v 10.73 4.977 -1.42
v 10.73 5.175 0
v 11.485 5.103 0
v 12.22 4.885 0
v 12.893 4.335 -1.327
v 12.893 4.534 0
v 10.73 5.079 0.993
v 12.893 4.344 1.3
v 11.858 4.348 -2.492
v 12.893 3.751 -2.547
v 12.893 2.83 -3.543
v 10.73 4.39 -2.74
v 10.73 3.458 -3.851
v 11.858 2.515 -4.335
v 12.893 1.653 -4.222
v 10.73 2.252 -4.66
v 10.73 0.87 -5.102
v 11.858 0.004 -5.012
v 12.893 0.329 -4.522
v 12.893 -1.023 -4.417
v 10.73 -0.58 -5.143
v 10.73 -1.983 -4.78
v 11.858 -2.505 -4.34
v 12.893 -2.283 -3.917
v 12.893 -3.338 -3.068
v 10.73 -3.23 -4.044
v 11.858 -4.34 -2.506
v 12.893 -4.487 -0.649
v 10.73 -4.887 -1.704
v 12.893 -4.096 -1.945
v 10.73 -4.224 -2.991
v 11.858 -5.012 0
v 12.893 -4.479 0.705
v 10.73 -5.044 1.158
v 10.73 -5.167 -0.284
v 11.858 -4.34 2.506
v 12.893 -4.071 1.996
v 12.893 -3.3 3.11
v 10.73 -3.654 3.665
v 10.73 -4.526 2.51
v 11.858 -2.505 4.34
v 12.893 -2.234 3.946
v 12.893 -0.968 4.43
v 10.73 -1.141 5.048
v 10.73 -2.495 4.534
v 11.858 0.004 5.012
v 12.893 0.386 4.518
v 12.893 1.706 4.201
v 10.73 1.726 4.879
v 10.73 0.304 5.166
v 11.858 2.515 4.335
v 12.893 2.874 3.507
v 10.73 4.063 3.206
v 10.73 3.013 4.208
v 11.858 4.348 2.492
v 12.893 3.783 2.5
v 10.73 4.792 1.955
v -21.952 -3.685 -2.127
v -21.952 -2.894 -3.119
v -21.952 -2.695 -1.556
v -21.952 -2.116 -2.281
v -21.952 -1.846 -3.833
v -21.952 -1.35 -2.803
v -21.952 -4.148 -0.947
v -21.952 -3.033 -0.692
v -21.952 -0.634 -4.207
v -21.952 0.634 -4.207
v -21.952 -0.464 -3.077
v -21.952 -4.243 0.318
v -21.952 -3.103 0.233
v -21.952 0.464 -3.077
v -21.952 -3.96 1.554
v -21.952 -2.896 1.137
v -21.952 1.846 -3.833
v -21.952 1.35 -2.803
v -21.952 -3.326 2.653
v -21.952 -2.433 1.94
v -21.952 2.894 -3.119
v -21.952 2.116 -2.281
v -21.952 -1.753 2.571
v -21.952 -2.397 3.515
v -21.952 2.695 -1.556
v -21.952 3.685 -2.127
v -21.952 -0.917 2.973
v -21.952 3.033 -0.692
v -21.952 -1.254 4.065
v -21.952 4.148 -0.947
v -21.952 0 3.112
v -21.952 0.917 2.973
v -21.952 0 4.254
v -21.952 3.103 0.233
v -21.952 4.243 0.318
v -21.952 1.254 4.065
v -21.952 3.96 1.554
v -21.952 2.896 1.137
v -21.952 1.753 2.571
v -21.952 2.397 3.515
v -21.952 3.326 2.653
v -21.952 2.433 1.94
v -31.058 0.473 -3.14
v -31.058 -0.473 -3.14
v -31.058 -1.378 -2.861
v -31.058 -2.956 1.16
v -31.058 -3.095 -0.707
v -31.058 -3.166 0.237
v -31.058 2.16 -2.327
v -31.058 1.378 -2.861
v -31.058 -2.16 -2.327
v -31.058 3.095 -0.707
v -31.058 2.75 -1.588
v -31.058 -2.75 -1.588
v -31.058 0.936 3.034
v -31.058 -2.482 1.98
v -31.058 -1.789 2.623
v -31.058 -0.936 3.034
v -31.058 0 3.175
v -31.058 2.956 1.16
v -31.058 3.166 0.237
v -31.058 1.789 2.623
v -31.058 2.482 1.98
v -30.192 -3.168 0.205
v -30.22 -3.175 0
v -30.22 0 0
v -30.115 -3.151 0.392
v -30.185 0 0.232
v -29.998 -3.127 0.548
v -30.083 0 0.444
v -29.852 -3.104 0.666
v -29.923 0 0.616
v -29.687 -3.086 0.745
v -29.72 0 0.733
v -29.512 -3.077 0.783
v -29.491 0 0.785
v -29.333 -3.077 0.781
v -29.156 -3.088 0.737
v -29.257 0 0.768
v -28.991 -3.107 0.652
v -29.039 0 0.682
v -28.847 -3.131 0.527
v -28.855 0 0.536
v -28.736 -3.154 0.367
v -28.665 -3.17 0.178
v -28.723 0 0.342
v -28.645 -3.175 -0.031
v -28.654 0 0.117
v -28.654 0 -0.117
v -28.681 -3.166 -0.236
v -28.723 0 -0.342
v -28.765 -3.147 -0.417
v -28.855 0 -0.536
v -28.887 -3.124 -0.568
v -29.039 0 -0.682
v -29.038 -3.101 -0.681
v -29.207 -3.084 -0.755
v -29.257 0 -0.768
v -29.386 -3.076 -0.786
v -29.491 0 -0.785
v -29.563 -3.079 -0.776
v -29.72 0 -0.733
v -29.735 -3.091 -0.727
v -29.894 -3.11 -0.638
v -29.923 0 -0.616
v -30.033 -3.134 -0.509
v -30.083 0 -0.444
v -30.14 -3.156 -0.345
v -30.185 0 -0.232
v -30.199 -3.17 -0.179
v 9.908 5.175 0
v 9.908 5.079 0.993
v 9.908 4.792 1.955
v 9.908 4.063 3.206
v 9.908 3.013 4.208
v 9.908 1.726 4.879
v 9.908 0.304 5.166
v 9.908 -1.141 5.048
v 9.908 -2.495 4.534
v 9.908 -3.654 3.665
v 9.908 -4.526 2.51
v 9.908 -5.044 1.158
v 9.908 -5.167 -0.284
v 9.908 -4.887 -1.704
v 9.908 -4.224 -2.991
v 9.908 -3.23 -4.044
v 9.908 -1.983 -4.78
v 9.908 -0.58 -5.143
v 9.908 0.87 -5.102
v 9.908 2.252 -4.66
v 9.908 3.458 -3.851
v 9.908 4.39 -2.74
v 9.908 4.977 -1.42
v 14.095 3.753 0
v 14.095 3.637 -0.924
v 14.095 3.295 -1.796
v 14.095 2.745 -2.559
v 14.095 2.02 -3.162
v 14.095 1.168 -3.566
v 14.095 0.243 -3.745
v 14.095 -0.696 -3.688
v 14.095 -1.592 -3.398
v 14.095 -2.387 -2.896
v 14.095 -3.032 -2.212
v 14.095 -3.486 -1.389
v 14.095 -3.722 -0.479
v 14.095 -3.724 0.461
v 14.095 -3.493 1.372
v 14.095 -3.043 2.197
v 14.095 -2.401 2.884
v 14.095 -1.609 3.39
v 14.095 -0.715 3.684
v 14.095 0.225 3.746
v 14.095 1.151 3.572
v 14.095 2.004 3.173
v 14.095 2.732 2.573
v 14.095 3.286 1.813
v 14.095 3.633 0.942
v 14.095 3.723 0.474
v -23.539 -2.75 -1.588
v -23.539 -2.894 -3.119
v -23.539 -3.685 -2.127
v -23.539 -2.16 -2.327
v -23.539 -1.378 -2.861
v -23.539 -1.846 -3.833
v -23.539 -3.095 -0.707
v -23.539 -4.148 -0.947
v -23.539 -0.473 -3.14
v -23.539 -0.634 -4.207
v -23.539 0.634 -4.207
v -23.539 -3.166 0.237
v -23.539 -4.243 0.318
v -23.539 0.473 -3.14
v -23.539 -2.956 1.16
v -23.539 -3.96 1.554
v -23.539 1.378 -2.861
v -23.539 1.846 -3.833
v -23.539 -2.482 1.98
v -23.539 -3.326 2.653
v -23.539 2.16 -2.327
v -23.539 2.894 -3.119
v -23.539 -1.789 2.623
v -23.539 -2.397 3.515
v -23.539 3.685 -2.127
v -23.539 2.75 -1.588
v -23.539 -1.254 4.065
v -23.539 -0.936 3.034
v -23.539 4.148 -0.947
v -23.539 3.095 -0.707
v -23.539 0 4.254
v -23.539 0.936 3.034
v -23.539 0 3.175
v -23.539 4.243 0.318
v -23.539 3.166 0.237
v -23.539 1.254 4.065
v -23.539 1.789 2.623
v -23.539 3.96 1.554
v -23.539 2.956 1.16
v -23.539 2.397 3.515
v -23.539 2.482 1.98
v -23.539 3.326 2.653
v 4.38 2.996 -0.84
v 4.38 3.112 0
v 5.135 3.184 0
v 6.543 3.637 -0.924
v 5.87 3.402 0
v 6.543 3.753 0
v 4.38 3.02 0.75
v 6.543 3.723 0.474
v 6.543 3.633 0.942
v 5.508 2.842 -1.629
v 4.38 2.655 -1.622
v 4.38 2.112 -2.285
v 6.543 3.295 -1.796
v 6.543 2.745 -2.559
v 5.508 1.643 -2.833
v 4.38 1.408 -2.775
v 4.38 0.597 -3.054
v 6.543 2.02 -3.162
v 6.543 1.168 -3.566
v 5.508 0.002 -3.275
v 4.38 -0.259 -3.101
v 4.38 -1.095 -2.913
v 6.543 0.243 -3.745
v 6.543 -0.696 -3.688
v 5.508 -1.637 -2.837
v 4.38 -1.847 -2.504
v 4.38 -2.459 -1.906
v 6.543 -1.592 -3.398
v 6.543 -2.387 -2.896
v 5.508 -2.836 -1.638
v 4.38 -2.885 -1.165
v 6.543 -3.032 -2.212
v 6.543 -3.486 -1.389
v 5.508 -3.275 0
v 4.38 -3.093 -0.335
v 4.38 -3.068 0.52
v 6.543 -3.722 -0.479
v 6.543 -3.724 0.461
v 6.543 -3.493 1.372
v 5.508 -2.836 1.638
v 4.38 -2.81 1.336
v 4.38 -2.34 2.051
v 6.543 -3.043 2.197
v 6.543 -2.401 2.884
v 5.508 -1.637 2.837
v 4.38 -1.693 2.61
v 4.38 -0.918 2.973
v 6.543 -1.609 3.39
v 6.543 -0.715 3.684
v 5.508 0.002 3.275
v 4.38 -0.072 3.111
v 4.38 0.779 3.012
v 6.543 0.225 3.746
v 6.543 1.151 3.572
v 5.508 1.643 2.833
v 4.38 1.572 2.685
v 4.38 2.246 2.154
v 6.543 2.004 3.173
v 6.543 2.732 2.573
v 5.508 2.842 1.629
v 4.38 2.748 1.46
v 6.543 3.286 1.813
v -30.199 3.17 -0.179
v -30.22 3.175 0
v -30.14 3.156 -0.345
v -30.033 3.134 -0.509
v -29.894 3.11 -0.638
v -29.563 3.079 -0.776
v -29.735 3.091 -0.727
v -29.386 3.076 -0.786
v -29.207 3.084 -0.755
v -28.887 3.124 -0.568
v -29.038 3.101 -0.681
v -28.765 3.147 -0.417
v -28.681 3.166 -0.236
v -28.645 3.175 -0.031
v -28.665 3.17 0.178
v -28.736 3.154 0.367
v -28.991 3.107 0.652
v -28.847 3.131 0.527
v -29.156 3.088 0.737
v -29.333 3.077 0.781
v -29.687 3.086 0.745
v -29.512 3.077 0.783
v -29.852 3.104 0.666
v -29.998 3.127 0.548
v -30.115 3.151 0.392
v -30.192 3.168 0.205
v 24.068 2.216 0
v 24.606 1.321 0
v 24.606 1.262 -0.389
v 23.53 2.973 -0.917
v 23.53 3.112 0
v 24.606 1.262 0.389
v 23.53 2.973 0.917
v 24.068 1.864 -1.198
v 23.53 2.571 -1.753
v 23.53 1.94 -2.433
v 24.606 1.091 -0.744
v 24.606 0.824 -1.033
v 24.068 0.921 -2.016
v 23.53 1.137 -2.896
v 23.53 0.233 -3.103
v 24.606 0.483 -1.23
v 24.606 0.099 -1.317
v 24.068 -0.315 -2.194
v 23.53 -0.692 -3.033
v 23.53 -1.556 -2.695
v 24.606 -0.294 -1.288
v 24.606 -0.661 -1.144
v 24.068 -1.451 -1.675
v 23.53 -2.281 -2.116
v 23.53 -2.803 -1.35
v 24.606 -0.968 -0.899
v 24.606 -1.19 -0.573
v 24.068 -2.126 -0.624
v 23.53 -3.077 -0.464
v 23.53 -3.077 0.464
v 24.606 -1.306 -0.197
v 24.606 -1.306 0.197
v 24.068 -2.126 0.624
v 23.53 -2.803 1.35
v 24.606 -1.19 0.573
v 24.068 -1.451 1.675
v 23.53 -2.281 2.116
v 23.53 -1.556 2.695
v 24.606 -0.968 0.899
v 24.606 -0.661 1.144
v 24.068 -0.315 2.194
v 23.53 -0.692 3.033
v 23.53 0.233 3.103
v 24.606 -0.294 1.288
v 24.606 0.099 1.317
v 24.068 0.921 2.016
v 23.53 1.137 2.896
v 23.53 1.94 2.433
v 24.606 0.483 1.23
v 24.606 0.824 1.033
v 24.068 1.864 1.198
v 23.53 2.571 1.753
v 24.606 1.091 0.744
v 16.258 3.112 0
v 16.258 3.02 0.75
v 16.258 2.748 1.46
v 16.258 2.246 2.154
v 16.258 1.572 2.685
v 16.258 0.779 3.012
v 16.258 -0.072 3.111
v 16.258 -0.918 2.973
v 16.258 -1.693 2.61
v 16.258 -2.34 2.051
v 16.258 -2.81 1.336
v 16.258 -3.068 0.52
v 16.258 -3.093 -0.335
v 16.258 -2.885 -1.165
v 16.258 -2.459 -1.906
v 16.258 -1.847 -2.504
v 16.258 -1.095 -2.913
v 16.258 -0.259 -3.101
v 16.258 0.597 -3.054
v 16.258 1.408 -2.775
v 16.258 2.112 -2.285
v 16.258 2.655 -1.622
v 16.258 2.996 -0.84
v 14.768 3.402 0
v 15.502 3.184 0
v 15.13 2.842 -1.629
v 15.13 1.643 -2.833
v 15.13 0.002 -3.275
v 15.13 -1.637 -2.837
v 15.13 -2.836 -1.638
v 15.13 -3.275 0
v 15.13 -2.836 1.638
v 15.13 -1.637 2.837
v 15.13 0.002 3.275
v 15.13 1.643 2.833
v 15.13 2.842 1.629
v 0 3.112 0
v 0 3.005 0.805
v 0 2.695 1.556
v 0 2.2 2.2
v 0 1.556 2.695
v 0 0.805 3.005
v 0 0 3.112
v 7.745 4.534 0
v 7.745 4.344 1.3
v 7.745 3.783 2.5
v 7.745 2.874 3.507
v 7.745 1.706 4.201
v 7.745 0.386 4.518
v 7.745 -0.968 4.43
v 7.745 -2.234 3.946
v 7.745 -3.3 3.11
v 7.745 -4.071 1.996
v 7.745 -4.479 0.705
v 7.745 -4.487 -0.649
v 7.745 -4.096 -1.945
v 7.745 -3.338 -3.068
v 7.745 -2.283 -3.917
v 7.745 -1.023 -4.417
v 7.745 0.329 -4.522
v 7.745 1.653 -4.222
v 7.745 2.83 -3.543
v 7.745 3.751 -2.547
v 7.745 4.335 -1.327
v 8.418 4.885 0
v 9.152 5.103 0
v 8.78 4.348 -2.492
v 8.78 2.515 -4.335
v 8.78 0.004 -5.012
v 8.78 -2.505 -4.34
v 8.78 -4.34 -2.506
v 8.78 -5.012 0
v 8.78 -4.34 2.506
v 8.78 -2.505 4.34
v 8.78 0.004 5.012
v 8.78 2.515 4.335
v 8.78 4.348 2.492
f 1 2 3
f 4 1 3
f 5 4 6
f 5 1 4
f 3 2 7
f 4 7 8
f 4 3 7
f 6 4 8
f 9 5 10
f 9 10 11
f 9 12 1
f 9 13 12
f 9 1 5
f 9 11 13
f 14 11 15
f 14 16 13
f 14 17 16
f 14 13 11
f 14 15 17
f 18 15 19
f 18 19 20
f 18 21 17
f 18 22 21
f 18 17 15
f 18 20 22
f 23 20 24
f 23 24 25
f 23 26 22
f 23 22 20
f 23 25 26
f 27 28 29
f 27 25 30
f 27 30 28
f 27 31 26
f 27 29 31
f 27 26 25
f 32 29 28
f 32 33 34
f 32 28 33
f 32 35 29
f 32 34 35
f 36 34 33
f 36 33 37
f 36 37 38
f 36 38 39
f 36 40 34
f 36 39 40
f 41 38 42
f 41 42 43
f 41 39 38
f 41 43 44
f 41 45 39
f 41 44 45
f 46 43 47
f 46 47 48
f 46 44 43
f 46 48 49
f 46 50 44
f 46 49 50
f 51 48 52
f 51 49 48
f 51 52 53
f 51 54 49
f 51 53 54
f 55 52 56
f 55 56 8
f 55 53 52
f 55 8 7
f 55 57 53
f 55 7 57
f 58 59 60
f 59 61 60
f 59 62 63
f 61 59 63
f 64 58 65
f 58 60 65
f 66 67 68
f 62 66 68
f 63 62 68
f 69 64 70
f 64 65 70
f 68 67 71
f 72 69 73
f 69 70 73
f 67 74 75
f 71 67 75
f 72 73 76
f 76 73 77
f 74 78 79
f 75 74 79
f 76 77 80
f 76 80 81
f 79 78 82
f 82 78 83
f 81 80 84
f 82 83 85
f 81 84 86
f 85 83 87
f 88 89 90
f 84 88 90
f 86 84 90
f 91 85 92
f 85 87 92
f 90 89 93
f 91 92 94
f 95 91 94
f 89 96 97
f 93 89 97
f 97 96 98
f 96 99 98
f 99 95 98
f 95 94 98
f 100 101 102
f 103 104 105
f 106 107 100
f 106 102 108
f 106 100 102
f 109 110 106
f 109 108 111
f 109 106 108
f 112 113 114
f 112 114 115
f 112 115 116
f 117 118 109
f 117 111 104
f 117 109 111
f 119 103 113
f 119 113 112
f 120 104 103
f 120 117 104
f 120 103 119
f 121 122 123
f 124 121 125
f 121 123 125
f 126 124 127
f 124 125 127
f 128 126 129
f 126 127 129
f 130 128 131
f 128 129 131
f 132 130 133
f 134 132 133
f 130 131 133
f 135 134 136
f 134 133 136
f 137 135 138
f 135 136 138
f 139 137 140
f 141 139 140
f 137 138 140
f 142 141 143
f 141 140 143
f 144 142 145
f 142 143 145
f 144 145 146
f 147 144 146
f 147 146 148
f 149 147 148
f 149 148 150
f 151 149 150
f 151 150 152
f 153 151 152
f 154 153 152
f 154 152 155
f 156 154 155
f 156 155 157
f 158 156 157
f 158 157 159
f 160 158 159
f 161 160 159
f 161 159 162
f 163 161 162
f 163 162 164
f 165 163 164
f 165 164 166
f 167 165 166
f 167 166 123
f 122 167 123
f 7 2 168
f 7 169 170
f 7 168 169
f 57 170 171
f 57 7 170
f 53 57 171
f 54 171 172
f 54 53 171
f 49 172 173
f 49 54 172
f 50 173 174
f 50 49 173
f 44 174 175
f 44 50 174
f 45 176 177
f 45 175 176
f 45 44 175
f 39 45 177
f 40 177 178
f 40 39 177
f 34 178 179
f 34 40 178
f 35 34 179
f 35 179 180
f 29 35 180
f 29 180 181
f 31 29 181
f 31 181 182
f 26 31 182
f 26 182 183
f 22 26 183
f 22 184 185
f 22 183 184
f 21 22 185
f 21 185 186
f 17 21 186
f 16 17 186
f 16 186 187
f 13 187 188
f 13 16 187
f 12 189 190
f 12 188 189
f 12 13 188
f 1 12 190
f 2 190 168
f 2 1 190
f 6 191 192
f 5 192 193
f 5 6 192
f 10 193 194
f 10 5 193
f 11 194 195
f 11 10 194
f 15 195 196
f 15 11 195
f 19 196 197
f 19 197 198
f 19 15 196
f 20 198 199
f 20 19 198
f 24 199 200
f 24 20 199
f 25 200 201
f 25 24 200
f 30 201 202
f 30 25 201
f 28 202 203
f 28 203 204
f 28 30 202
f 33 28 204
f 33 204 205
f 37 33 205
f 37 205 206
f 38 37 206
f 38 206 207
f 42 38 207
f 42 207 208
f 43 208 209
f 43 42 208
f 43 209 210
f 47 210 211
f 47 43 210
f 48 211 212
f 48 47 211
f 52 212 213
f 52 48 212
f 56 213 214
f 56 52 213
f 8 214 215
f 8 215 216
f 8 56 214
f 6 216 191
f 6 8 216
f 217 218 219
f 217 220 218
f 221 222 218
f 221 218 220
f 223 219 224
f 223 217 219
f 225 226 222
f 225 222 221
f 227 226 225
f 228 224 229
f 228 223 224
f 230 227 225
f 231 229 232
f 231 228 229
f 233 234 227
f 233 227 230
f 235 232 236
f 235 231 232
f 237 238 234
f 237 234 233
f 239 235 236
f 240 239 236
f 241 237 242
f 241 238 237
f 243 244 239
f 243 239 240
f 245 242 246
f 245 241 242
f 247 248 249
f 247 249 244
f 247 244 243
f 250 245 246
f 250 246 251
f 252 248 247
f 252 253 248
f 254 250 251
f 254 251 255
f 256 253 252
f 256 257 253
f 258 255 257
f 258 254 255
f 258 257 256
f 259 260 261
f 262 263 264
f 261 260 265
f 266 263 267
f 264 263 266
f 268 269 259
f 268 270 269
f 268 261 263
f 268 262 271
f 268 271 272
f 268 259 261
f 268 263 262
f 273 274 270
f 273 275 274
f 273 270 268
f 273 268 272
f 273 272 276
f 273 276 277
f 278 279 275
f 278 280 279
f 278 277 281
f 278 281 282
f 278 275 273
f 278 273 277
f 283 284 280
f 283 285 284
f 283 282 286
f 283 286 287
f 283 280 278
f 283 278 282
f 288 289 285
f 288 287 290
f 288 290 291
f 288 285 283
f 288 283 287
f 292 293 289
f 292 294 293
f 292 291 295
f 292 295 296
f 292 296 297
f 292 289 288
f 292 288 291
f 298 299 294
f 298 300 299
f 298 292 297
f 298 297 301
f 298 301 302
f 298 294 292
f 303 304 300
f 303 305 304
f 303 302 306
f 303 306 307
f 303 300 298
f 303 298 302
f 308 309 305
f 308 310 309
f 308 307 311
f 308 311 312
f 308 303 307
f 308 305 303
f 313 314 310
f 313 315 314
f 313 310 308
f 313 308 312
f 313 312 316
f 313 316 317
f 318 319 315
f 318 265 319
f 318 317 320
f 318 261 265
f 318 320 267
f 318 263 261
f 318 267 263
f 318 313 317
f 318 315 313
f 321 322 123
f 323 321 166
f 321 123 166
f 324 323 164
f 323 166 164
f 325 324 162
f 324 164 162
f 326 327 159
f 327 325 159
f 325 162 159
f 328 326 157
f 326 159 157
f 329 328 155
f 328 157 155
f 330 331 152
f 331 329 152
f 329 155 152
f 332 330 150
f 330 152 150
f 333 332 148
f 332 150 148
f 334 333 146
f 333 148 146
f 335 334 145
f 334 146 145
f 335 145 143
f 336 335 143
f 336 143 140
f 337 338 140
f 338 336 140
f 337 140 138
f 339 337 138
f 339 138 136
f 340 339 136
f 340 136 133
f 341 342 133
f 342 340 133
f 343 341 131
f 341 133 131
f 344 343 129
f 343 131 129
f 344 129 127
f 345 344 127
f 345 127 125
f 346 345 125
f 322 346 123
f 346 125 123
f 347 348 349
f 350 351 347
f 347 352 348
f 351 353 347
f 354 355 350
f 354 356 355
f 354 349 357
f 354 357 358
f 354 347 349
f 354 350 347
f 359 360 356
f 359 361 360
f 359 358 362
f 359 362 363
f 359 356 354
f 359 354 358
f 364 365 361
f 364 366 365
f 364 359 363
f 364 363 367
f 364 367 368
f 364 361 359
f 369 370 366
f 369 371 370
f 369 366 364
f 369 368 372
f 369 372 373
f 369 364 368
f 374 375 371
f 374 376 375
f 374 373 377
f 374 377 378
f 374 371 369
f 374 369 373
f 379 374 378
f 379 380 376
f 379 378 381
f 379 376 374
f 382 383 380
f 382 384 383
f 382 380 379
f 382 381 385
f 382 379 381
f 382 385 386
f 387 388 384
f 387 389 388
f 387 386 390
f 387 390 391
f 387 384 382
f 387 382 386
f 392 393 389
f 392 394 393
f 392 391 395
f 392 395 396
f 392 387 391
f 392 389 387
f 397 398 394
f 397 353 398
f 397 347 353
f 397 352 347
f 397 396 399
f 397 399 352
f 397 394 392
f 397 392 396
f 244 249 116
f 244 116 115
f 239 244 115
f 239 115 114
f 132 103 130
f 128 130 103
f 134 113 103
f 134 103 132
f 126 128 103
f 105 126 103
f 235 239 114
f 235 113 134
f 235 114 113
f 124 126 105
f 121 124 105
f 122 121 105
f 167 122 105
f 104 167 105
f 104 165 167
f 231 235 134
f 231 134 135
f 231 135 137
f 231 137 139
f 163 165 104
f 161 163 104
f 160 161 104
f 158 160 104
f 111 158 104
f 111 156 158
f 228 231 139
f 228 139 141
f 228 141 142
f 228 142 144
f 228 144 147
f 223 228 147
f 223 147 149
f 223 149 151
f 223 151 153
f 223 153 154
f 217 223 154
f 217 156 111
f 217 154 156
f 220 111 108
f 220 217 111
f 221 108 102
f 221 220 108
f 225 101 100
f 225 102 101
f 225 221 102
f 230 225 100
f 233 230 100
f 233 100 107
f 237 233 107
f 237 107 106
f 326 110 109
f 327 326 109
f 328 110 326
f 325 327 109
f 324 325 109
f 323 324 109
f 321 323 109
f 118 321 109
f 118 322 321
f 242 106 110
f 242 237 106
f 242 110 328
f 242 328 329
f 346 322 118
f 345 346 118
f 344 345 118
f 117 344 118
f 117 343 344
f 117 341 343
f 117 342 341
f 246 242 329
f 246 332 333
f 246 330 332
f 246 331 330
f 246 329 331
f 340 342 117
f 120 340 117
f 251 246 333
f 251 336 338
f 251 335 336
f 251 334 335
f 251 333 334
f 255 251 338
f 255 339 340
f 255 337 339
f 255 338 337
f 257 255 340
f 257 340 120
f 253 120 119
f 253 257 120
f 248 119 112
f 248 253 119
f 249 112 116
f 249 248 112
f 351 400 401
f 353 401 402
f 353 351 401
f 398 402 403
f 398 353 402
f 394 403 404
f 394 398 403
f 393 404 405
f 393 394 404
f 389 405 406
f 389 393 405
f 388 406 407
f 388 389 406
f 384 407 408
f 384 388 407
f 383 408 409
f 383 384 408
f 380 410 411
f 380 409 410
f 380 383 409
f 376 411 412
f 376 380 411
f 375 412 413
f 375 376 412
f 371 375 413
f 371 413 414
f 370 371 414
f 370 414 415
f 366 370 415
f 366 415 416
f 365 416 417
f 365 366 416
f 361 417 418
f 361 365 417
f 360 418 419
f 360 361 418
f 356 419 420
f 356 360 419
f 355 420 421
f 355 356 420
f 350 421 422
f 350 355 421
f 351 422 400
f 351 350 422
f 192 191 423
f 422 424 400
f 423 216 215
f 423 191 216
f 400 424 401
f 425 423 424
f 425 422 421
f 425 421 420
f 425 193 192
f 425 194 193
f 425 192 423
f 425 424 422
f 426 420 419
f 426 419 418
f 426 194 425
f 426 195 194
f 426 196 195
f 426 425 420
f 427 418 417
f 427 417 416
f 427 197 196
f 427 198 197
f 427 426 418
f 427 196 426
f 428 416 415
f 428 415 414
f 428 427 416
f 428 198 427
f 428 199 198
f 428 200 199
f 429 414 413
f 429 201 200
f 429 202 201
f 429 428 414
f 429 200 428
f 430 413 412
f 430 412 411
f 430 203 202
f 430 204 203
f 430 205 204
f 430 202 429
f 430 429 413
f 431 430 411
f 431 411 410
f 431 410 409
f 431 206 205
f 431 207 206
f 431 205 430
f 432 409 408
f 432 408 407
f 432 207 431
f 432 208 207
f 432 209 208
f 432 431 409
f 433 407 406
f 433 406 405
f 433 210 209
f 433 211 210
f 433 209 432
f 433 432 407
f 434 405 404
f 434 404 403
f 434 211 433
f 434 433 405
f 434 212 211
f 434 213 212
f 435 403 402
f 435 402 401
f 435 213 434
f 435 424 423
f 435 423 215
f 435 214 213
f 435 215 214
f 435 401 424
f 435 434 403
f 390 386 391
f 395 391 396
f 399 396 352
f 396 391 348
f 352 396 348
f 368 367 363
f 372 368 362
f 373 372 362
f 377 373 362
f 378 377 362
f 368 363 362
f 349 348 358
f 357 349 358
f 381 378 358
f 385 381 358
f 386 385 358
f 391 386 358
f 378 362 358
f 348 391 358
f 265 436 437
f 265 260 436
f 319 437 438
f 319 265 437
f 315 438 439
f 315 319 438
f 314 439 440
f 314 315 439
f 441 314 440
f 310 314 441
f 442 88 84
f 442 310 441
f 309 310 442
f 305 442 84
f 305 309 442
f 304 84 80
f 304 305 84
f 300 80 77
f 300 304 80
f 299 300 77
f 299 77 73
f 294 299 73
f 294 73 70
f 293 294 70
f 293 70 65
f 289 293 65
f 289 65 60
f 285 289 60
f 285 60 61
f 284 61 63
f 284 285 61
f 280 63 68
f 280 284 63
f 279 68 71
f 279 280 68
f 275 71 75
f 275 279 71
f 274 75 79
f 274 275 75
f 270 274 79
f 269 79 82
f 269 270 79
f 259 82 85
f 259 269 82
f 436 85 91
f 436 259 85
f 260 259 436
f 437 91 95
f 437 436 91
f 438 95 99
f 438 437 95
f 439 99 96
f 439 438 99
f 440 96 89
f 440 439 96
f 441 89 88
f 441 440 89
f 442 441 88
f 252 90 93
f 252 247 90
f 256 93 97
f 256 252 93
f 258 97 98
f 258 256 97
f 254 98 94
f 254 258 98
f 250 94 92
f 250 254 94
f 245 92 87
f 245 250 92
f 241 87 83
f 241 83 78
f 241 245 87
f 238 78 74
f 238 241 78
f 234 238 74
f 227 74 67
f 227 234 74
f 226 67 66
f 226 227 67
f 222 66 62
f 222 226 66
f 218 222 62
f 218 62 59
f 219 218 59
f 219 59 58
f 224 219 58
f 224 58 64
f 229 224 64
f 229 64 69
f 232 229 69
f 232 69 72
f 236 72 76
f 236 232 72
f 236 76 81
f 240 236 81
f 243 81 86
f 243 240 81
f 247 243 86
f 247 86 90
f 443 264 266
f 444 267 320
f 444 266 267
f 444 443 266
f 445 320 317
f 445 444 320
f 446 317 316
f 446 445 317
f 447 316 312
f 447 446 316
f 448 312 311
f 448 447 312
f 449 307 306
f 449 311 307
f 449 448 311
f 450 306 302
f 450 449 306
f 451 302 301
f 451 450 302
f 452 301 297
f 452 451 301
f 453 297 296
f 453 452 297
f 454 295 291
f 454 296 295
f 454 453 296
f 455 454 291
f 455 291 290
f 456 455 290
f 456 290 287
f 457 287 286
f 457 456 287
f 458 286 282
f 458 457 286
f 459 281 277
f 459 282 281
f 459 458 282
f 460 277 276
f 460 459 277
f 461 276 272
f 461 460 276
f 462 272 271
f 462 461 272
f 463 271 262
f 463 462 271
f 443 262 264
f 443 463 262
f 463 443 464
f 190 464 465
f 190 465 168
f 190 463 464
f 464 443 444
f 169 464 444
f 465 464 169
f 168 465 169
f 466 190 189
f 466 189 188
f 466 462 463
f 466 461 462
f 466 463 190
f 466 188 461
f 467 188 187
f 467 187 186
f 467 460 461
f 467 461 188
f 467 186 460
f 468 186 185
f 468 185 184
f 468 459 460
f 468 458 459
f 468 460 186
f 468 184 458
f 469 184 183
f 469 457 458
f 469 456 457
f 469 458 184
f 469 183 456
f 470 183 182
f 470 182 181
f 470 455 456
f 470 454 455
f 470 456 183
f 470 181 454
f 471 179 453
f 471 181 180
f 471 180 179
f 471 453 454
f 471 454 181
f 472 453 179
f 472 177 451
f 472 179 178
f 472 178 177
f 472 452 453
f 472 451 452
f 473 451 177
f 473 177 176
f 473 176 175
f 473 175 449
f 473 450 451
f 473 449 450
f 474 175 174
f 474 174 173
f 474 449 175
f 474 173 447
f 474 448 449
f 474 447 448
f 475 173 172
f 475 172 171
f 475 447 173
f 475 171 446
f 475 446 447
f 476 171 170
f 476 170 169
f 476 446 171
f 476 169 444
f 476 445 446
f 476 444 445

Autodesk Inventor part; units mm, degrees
ref_plane "YZ Plane" through (0, 0, 0) normal (1, 0, 0) x (0, 1, 0)
ref_plane "XZ Plane" through (0, 0, 0) normal (0, 1, 0) x (-1, 0, 0)
sketch "Sketch1" plane through (0, 0, 0) normal (0, 0, 1) x (1, 0, 0)
  line L0 (0, 0) -> (0, 3.1115)
  line L1 (0, 5.5562) -> (26.1938, 5.5563) construction
  line L2 (0, 7.9375) -> (26.1938, 7.9375) construction
  line L3 (26.1938, 7.9375) -> (26.1938, 5.5563) construction
  line L4 (26.1938, 5.5563) -> (26.1938, 0) construction
  line L5 (26.1938, 0) -> (24.6063, 0) construction
  line L6 (26.1938, 6.35) -> (34.3853, 6.35) construction
  line L7 (26.1938, 0) -> (34.3853, 0) construction
  line L8 (34.3853, 0) -> (34.3853, 6.35) construction
  line L9 (16.6688, 7.9375) -> (16.6688, 0) construction
  circle A0 centre (16.6688, 7.5565) radius 2.3813 construction
  circle A1 centre (16.6688, 5.4928) radius 2.3813 construction
  circle A2 centre (10.3188, 7.5565) radius 2.3813 construction
  circle A3 centre (10.3188, 5.4928) radius 2.3813 construction
  line L10 (10.3188, 7.9375) -> (10.3188, 0) construction
  line L11 (0, 5.1753) -> (8.7313, 5.1753) construction
  line L12 (8.7313, 5.1753) -> (8.7313, 0) construction
  line L13 (5.5563, 5.1753) -> (5.5563, 0) construction
  line L14 (18.2563, 5.1753) -> (18.2563, 0) construction
  line L15 (21.4313, 5.1753) -> (21.4313, 0) construction
  line L16 (0, 3.1115) -> (5.5563, 3.1115)
  line L17 (5.5563, 3.1115) -> (8.7313, 5.1753)
  line L18 (18.2563, 5.1753) -> (21.4313, 3.1115) construction
  line L19 (11.9063, 5.1753) -> (11.9063, 0) construction
  line L20 (15.0813, 5.1753) -> (15.0813, 0) construction
  line L21 (11.9063, 5.1753) -> (15.0813, 3.1115)
  line L22 (21.4313, 3.3734) -> (34.3853, 3.3734) construction
  line L23 (24.6063, 3.3734) -> (24.6063, 1.321) construction
  line L24 (21.4313, 3.3734) -> (20.1197, 5.5563) construction
  line L25 (26.1938, 3.1115) -> (30.9563, 3.1115) construction
  line L26 (30.9563, 3.1115) -> (30.9563, 0) construction
  line L27 (31.75, 3.3734) -> (31.75, 0) construction
  line L28 (31.75, 0) -> (29.723, 3.3734) construction
  line L29 (0, 7.9375) -> (-1.5875, 7.9375) construction
  line L30 (-1.5875, 7.9375) -> (-1.5875, 3.3734) construction
  line L31 (-1.5875, 3.3734) -> (5.5563, 3.3734) construction
  line L32 (5.5563, 3.1115) -> (15.0813, 3.1115) construction
  line L33 (15.0813, 3.1115) -> (23.5304, 3.1115)
  line L34 (11.9063, 5.1753) -> (26.1938, 5.1753) construction
  line L35 (8.7313, 5.1753) -> (11.9063, 5.1753)
  line L36 (24.6063, 3.1115) -> (26.1938, 3.1115) construction
  line L37 (24.6063, 1.321) -> (23.5304, 3.1115)
  line L38 (25.4, 0) -> (25.4, 3.3734) construction
  line L39 (24.6063, 1.321) -> (24.6063, 0)
  line L40 (23.5304, 3.1115) -> (24.6063, 3.1115) construction
  line L41 (0, 3.1115) -> (0, 12.7) construction
  line L42 (24.6063, 0) -> (0, 0)
  line L43 (24.6063, 1.321) -> (25.4, 0) construction
  point P0 (0, 0)
  dimension "d0" = 12.7
  dimension "d1" = 5.5563
  dimension "d2" = 7.9375
  dimension "d3" = 26.1938
  dimension "d4" = 8.1915
  dimension "d5" = 6.35
  dimension "d6" = 9.525
  dimension "d7" = 6.35
  dimension "d8" = 0.381
  dimension "d9" = 0.381
  dimension "d10" = 0.0635
  dimension "d11" = 0.0635
  dimension "d12" = 1.5875
  dimension "d13" = 4.7625
  dimension "d14" = 1.5875
  dimension "d15" = 4.7625
  dimension "d17" = 1.5875
  dimension "d18" = 4.7625
  dimension "d19" = 3.3734
  dimension "d20" = 3.175
  dimension "d21" = 31
  dimension "d23" = 9.525
  dimension "d24" = 0.7937
  dimension "d25" = 31
  dimension "d26" = 1.5875
  dimension "d33" = 4.7625
  dimension "d35" = 31
  dimension "d36" = 3.3734
  dimension "d37" = 3.1115
  dimension "d38" = 0.7937
  dimension "d43" = 10.3187
revolve "Revolution1" add sketch "Sketch1" angle 360 about axis through (24.6063, 0, 0) along (-1, 0, 0)
ref_plane "Work Plane1" through (10.3188, 0, 0) normal (-1, 0, 0) x (0, 0, 1)
fillet "Fillet1" radius 3.9688 4 edges at (5.5563, -3.1115, 0) (15.0813, -3.1115, 0) (11.9063, -5.1753, 0) (8.7313, -5.1753, 0)
sketch "Sketch2" plane through (0, 0, 0) normal (-1, 0, 0) x (0, 0, 1)
  circle A0 centre (0, 0) radius 3.1115 projected
extrude "Extrusion1" add sketch "Sketch2" along normal blind 23.5394
sketch "Sketch3" plane through (0, 0, 0) normal (0, 0, 1) x (1, 0, 0)
  line L0 (-23.5394, 3.1115) -> (4.3798, 3.1115) projected
  arc A0 (4.3798, 3.1115) -> (6.5427, 3.7527) centre (4.3798, 7.0802) ccw projected
  line L1 (6.5427, 3.7527) -> (7.7448, 4.5341) projected
  arc A1 (9.9077, 5.1753) -> (7.7448, 4.5341) centre (9.9077, 1.2065) ccw projected
  line L2 (9.9077, 5.1753) -> (10.7298, 5.1753) projected
  arc A2 (12.8927, 4.5341) -> (10.7298, 5.1753) centre (10.7298, 1.2065) ccw projected
  line L3 (12.8927, 4.5341) -> (14.0948, 3.7527) projected
  arc A3 (14.0948, 3.7527) -> (16.2577, 3.1115) centre (16.2577, 7.0803) ccw projected
  line L4 (16.2577, 3.1115) -> (23.5304, 3.1115) projected
  circle A4 centre (7.5381, 9.9656) radius 2.3812
  line L5 (4.3798, 7.0802) -> (4.3798, 3.1115) construction
  line L6 (4.3798, 7.0802) -> (6.5427, 3.7527) construction
  line L7 (9.9077, 1.2065) -> (7.7448, 4.5341) construction
  line L8 (9.9077, 1.2065) -> (9.9077, 5.1753) construction
  line L9 (10.7298, 1.2065) -> (10.7298, 5.1753) construction
  line L10 (10.7298, 1.2065) -> (12.8927, 4.5341) construction
  line L11 (16.2577, 7.0803) -> (14.0948, 3.7527) construction
  line L12 (16.2577, 7.0803) -> (16.2577, 3.1115) construction
  line L13 (-5.9448, 5.4927) -> (4.3798, 5.4927)
  arc A5 (4.3798, 5.4927) -> (5.2449, 5.7492) centre (4.3798, 7.0802) ccw
  line L14 (7.7448, 4.5341) -> (6.4471, 6.5306) construction
  line L15 (5.2449, 5.7492) -> (6.4471, 6.5306)
  line L16 (9.9077, 5.1753) -> (9.9077, 7.5565) construction
  arc A6 (9.9077, 7.5565) -> (6.4471, 6.5306) centre (9.9077, 1.2065) ccw
  point P0 (0, 0)
  dimension "d45" = 4.7625
  dimension "d47" = 2.3813
  dimension "d49" = 2.3876
sketch "Sketch4" plane through (-23.5394, 0, 0) normal (-1, 0, 0) x (0, 0, 1)
  circle A0 centre (0, 0) radius 3.1115 projected
  circle A1 centre (0, 0) radius 4.2545
  dimension "d50" = 8.509
extrude "Extrusion2" add sketch "Sketch4" against normal blind 1.5875
sketch "Sketch5" plane through (-23.5394, 0, 0) normal (-1, 0, 0) x (0, 0, 1)
  circle A0 centre (0, 0) radius 4.2545 projected
  circle A1 centre (0, 0) radius 3.175
  dimension "d54" = 6.35
extrude "Extrusion3" add sketch "Sketch5" along normal blind 4.9784 contours A1
sketch "Sketch6" plane through (0, 0, 0) normal (0, 1, 0) x (-1, 0, 0)
  line L0 (28.5178, -3.175) -> (28.5178, 3.175) projected
  line L1 (23.5394, 3.175) -> (23.5394, -3.175) projected
  line L2 (23.5394, 3.175) -> (28.5178, 3.175) projected
  line L3 (23.5394, -3.175) -> (28.5178, -3.175) projected
  circle A0 centre (29.4322, 0) radius 0.7874
  line L4 (28.6448, 3.175) -> (28.6448, -3.175) construction
  line L5 (28.5178, 0) -> (29.4322, 0) construction
  line L6 (28.5178, 3.175) -> (28.6448, 3.175) construction
  line L7 (28.6448, -3.175) -> (28.5178, -3.175) construction
  line L8 (28.5178, 3.175) -> (31.0578, 3.175)
  line L9 (31.0578, 3.175) -> (31.0578, 0)
  line L10 (31.0578, -3.175) -> (28.5178, -3.175) construction
  line L11 (28.5178, 0) -> (31.0578, 0)
  line L12 (31.0578, 0) -> (31.0578, -3.175) construction
  line L13 (28.5178, 0) -> (28.5178, 3.175)
  point P0 (0, 0)
  point P1 (30.2196, 0)
  point P2 (28.6448, 0)
  dimension "d57" = 1.5748
  dimension "d58" = 0.127
  dimension "d60" = 2.54
sketch "Sketch7" plane through (-28.5178, 0, 0) normal (-1, 0, 0) x (0, 0, 1)
  circle A0 centre (0, 0) radius 3.175 projected
extrude "Extrusion4" add sketch "Sketch7" along normal blind 2.54
extrude "Extrusion5" cut sketch "Sketch6" along normal through all both and the other way through all contours L11 A0 | A0 L11
equation "\"d1\" = d28"
equation "\"d2\" = d29"
equation "\"d8\" = d30"
equation "\"d9\" = d8"
equation "\"d10\" = d31"
equation "\"d11\" = d10"
equation "\"d17\" = d12"
equation "\"d18\" = d13"
equation "\"d23\" = d22"
equation "\"d25\" = d21"
equation "\"d35\" = d25"
equation "\"d44\" = -d43"
equation "\"d28\" = 5.55625"
equation "\"d29\" = 7.9375"
equation "\"d30\" = 0.381"
equation "\"d31\" = 0.0635"
equation "\"d22\" = 9.525"
properties part number "Shifting Shaft" material "Steel"
